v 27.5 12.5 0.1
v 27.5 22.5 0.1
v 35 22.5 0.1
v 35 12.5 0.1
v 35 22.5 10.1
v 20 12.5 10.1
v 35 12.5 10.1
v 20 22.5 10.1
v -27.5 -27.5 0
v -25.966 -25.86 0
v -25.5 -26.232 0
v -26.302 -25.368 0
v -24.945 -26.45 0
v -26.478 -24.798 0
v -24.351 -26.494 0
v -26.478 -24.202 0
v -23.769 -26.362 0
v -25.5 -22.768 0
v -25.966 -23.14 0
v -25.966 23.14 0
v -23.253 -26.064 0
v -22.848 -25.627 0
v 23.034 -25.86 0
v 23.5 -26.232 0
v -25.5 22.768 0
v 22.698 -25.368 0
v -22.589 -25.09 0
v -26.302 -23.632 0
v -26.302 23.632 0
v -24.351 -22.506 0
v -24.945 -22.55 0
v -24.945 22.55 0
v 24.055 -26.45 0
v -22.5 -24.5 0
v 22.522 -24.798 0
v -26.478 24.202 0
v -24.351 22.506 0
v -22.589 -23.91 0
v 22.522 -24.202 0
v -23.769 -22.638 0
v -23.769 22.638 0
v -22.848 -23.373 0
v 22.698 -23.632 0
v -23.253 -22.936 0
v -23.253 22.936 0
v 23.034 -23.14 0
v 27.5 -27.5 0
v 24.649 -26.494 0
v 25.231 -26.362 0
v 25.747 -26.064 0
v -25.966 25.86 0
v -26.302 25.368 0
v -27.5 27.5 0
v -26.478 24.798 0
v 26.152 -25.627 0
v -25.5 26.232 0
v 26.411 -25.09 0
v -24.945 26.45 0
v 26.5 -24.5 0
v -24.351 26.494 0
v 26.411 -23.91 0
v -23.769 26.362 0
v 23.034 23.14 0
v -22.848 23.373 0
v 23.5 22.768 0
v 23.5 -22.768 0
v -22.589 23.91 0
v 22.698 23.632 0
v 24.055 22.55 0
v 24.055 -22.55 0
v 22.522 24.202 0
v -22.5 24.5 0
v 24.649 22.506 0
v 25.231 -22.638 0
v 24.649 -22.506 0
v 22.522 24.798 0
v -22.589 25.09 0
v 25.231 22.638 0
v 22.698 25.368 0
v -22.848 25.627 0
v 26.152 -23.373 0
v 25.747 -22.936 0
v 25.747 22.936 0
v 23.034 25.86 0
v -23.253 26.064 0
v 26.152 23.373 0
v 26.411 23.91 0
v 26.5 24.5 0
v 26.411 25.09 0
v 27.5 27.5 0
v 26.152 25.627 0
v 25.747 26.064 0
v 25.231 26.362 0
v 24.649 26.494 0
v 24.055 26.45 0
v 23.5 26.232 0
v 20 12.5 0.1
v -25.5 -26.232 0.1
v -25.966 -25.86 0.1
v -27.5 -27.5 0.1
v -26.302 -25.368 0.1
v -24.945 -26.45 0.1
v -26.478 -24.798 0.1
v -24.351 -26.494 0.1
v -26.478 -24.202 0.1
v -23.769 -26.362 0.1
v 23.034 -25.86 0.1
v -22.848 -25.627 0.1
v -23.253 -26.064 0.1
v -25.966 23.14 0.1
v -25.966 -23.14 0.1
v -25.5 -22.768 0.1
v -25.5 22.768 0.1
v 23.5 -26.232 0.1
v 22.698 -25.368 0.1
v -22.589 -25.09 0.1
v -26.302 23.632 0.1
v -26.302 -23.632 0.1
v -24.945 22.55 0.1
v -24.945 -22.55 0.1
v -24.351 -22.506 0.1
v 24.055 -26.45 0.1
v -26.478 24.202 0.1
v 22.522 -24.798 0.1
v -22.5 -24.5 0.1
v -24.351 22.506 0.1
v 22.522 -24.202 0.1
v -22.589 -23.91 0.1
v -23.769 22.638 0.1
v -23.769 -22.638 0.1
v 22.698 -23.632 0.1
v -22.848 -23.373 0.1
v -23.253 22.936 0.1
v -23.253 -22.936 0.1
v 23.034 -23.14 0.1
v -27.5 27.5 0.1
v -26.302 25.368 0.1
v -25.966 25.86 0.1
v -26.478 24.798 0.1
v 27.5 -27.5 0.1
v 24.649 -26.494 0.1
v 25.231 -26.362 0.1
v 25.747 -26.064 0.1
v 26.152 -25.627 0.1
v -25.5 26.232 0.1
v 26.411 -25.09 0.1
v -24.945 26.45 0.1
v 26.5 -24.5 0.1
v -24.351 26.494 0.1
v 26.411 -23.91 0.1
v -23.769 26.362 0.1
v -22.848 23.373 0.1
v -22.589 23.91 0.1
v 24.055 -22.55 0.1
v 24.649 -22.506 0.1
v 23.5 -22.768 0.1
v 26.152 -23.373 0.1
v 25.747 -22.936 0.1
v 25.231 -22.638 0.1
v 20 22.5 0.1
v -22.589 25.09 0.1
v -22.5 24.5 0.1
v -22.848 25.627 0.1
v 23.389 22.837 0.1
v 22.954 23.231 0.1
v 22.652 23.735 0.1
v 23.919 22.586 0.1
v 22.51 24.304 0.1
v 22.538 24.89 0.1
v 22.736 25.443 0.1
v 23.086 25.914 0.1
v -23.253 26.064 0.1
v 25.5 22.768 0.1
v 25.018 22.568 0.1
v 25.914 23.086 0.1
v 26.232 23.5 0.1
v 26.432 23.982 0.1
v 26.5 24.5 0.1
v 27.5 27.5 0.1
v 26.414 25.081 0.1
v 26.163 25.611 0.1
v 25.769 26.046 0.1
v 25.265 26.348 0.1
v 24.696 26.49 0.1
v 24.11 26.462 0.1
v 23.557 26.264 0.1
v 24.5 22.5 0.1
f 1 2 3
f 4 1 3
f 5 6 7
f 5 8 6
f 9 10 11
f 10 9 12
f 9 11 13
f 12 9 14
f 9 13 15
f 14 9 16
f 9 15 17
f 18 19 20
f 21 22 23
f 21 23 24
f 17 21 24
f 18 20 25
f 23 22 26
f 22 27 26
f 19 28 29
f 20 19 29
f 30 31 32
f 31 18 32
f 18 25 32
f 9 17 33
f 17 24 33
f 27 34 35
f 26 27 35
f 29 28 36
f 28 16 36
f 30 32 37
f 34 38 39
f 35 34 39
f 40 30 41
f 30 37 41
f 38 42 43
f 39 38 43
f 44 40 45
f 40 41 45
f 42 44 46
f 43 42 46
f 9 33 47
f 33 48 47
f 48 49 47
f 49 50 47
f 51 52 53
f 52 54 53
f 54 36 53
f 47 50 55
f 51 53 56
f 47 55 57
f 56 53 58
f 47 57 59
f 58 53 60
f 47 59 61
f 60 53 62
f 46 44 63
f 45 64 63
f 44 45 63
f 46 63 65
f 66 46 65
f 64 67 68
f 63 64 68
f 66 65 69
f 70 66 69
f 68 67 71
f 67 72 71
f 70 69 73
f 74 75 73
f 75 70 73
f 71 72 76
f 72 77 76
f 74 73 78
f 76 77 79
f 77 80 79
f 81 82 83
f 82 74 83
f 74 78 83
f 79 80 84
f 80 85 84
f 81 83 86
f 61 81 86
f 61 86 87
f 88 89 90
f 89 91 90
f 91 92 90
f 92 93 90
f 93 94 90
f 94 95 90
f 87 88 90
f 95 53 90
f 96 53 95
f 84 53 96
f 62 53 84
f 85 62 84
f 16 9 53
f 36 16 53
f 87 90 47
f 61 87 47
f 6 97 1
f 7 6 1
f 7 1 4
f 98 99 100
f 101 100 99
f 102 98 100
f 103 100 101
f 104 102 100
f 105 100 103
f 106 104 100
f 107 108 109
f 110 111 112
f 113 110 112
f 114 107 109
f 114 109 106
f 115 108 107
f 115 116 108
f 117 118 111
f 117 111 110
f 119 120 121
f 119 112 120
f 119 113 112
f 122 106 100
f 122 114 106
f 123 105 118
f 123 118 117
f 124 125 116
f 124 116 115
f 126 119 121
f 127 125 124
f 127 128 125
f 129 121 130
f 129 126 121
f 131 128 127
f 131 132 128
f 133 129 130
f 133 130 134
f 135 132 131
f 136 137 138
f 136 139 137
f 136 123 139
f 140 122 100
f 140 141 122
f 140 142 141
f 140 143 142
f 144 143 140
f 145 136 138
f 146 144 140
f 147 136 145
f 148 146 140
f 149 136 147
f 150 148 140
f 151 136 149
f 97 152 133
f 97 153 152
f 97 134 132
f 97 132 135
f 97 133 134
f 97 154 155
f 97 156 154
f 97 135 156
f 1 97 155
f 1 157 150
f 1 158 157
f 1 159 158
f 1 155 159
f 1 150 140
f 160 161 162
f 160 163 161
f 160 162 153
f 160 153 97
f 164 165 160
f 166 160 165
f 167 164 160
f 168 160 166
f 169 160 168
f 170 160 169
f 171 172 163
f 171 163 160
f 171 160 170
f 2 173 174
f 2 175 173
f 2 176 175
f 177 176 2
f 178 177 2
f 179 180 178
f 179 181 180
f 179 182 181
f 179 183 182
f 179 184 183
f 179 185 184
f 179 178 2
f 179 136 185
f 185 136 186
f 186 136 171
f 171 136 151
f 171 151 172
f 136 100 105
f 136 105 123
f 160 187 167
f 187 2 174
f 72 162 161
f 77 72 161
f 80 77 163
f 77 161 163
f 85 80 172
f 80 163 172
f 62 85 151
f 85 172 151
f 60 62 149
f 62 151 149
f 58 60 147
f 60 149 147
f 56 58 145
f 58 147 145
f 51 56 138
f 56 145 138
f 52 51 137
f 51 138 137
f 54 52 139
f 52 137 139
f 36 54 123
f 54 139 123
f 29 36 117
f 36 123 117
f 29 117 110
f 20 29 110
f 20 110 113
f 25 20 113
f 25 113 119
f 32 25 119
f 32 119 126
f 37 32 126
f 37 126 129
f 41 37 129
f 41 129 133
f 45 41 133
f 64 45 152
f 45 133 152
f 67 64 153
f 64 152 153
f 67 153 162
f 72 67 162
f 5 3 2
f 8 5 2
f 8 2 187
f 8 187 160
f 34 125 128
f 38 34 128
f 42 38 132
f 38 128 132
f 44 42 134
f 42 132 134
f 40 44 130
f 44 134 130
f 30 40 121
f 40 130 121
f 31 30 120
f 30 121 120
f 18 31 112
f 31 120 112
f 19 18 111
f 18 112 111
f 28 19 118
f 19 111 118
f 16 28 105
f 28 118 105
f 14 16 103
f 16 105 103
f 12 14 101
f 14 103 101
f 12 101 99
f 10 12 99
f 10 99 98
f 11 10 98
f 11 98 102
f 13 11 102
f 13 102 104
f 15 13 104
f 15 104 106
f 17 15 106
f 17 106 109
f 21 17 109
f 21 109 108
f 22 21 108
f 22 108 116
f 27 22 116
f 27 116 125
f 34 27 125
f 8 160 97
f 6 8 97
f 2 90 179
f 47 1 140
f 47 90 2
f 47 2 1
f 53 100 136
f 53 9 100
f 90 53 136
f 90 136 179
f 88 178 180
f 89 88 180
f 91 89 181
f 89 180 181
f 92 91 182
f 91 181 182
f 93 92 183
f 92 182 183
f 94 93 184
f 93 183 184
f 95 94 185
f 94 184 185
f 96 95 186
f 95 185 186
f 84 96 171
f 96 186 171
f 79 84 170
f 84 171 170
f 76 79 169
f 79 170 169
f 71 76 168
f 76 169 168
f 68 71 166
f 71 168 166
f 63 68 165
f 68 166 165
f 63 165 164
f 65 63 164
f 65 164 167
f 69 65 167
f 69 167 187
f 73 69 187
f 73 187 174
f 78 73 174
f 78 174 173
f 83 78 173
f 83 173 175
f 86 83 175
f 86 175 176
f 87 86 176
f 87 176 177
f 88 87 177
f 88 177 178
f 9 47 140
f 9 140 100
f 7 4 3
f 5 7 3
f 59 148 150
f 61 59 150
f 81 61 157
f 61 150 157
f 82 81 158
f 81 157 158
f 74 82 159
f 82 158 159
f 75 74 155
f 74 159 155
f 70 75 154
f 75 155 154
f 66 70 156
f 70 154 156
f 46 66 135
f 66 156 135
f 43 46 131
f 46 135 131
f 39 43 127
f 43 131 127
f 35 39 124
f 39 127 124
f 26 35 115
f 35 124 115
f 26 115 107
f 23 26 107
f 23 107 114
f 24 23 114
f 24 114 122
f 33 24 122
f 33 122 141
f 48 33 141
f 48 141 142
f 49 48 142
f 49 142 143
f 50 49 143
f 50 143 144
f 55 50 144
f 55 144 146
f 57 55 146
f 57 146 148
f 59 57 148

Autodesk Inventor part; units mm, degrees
ref_plane "YZ Plane" through (0, 0, 0) normal (1, 0, 0) x (0, 1, 0)
ref_plane "XZ Plane" through (0, 0, 0) normal (0, 1, 0) x (-1, 0, 0)
ref_plane "XY Plane" through (0, 0, 0) normal (0, 0, 1) x (1, 0, 0)
sketch "스케치2" plane through (0, 0, 0) normal (0, 0, 1) x (1, 0, 0)
  line L0 (-27.5, 27.5) -> (27.5, 27.5)
  line L1 (27.5, 27.5) -> (27.5, -27.5)
  line L2 (27.5, -27.5) -> (-27.5, -27.5)
  line L3 (-27.5, -27.5) -> (-27.5, 27.5)
  line L4 (-27.5, 27.5) -> (27.5, -27.5) construction
  line L5 (27.5, 27.5) -> (-27.5, -27.5) construction
  point P0 (0, 0)
  dimension "d0" = 55
  dimension "d1" = 55
extrude "돌출1" add sketch "스케치2" along normal blind 0.1
sketch "스케치3" plane through (0, 0, 0.1) normal (0, 0, 1) x (1, 0, 0)
  line L0 (27.5, -27.5) -> (27.5, 27.5) projected
  line L1 (27.5, 27.5) -> (-27.5, 27.5) projected
  circle A0 centre (24.5, 24.5) radius 3
  circle A1 centre (-24.5, 24.5) radius 3
  circle A2 centre (-24.5, -24.5) radius 3
  circle A3 centre (24.5, -24.5) radius 3
  line L2 (-27.5, 27.5) -> (-27.5, -27.5) projected
  line L3 (-27.5, -27.5) -> (27.5, -27.5) projected
  circle A4 centre (24.5, 24.5) radius 2
  circle A5 centre (-24.5, 24.5) radius 2
  circle A6 centre (-24.5, -24.5) radius 2
  circle A7 centre (24.5, -24.5) radius 2
  point P0 (0, 0)
  dimension "d5" = 6
  dimension "d6" = 6
  dimension "d7" = 6
  dimension "d8" = 6
  dimension "d9" = 4
  dimension "d10" = 4
  dimension "d11" = 4
  dimension "d12" = 4
extrude "돌출2" cut sketch "스케치3" against normal up to surface (0.1 mm away) contours A4 | A5 | A6 | A7
sketch "스케치4" plane through (0, 0, 0.1) normal (0, 0, 1) x (1, 0, 0)
  line L0 (20, 12.5) -> (35, 12.5)
  line L1 (35, 12.5) -> (35, 22.5)
  line L2 (35, 22.5) -> (20, 22.5)
  line L3 (20, 22.5) -> (20, 12.5)
  line L4 (20, 12.5) -> (35, 22.5) construction
  line L5 (35, 12.5) -> (20, 22.5) construction
  line L6 (27.5, -27.5) -> (27.5, 27.5) projected
  circle A0 centre (24.5, 24.5) radius 2 projected
  point P0 (0, 0)
  point P1 (27.5, 17.5)
  dimension "d15" = 15
  dimension "d16" = 10
extrude "돌출3" add sketch "스케치4" along normal blind 10 contours L3 L2 L6 L0 | L6 L2 L1 L0
properties part number "모터드라이버"
